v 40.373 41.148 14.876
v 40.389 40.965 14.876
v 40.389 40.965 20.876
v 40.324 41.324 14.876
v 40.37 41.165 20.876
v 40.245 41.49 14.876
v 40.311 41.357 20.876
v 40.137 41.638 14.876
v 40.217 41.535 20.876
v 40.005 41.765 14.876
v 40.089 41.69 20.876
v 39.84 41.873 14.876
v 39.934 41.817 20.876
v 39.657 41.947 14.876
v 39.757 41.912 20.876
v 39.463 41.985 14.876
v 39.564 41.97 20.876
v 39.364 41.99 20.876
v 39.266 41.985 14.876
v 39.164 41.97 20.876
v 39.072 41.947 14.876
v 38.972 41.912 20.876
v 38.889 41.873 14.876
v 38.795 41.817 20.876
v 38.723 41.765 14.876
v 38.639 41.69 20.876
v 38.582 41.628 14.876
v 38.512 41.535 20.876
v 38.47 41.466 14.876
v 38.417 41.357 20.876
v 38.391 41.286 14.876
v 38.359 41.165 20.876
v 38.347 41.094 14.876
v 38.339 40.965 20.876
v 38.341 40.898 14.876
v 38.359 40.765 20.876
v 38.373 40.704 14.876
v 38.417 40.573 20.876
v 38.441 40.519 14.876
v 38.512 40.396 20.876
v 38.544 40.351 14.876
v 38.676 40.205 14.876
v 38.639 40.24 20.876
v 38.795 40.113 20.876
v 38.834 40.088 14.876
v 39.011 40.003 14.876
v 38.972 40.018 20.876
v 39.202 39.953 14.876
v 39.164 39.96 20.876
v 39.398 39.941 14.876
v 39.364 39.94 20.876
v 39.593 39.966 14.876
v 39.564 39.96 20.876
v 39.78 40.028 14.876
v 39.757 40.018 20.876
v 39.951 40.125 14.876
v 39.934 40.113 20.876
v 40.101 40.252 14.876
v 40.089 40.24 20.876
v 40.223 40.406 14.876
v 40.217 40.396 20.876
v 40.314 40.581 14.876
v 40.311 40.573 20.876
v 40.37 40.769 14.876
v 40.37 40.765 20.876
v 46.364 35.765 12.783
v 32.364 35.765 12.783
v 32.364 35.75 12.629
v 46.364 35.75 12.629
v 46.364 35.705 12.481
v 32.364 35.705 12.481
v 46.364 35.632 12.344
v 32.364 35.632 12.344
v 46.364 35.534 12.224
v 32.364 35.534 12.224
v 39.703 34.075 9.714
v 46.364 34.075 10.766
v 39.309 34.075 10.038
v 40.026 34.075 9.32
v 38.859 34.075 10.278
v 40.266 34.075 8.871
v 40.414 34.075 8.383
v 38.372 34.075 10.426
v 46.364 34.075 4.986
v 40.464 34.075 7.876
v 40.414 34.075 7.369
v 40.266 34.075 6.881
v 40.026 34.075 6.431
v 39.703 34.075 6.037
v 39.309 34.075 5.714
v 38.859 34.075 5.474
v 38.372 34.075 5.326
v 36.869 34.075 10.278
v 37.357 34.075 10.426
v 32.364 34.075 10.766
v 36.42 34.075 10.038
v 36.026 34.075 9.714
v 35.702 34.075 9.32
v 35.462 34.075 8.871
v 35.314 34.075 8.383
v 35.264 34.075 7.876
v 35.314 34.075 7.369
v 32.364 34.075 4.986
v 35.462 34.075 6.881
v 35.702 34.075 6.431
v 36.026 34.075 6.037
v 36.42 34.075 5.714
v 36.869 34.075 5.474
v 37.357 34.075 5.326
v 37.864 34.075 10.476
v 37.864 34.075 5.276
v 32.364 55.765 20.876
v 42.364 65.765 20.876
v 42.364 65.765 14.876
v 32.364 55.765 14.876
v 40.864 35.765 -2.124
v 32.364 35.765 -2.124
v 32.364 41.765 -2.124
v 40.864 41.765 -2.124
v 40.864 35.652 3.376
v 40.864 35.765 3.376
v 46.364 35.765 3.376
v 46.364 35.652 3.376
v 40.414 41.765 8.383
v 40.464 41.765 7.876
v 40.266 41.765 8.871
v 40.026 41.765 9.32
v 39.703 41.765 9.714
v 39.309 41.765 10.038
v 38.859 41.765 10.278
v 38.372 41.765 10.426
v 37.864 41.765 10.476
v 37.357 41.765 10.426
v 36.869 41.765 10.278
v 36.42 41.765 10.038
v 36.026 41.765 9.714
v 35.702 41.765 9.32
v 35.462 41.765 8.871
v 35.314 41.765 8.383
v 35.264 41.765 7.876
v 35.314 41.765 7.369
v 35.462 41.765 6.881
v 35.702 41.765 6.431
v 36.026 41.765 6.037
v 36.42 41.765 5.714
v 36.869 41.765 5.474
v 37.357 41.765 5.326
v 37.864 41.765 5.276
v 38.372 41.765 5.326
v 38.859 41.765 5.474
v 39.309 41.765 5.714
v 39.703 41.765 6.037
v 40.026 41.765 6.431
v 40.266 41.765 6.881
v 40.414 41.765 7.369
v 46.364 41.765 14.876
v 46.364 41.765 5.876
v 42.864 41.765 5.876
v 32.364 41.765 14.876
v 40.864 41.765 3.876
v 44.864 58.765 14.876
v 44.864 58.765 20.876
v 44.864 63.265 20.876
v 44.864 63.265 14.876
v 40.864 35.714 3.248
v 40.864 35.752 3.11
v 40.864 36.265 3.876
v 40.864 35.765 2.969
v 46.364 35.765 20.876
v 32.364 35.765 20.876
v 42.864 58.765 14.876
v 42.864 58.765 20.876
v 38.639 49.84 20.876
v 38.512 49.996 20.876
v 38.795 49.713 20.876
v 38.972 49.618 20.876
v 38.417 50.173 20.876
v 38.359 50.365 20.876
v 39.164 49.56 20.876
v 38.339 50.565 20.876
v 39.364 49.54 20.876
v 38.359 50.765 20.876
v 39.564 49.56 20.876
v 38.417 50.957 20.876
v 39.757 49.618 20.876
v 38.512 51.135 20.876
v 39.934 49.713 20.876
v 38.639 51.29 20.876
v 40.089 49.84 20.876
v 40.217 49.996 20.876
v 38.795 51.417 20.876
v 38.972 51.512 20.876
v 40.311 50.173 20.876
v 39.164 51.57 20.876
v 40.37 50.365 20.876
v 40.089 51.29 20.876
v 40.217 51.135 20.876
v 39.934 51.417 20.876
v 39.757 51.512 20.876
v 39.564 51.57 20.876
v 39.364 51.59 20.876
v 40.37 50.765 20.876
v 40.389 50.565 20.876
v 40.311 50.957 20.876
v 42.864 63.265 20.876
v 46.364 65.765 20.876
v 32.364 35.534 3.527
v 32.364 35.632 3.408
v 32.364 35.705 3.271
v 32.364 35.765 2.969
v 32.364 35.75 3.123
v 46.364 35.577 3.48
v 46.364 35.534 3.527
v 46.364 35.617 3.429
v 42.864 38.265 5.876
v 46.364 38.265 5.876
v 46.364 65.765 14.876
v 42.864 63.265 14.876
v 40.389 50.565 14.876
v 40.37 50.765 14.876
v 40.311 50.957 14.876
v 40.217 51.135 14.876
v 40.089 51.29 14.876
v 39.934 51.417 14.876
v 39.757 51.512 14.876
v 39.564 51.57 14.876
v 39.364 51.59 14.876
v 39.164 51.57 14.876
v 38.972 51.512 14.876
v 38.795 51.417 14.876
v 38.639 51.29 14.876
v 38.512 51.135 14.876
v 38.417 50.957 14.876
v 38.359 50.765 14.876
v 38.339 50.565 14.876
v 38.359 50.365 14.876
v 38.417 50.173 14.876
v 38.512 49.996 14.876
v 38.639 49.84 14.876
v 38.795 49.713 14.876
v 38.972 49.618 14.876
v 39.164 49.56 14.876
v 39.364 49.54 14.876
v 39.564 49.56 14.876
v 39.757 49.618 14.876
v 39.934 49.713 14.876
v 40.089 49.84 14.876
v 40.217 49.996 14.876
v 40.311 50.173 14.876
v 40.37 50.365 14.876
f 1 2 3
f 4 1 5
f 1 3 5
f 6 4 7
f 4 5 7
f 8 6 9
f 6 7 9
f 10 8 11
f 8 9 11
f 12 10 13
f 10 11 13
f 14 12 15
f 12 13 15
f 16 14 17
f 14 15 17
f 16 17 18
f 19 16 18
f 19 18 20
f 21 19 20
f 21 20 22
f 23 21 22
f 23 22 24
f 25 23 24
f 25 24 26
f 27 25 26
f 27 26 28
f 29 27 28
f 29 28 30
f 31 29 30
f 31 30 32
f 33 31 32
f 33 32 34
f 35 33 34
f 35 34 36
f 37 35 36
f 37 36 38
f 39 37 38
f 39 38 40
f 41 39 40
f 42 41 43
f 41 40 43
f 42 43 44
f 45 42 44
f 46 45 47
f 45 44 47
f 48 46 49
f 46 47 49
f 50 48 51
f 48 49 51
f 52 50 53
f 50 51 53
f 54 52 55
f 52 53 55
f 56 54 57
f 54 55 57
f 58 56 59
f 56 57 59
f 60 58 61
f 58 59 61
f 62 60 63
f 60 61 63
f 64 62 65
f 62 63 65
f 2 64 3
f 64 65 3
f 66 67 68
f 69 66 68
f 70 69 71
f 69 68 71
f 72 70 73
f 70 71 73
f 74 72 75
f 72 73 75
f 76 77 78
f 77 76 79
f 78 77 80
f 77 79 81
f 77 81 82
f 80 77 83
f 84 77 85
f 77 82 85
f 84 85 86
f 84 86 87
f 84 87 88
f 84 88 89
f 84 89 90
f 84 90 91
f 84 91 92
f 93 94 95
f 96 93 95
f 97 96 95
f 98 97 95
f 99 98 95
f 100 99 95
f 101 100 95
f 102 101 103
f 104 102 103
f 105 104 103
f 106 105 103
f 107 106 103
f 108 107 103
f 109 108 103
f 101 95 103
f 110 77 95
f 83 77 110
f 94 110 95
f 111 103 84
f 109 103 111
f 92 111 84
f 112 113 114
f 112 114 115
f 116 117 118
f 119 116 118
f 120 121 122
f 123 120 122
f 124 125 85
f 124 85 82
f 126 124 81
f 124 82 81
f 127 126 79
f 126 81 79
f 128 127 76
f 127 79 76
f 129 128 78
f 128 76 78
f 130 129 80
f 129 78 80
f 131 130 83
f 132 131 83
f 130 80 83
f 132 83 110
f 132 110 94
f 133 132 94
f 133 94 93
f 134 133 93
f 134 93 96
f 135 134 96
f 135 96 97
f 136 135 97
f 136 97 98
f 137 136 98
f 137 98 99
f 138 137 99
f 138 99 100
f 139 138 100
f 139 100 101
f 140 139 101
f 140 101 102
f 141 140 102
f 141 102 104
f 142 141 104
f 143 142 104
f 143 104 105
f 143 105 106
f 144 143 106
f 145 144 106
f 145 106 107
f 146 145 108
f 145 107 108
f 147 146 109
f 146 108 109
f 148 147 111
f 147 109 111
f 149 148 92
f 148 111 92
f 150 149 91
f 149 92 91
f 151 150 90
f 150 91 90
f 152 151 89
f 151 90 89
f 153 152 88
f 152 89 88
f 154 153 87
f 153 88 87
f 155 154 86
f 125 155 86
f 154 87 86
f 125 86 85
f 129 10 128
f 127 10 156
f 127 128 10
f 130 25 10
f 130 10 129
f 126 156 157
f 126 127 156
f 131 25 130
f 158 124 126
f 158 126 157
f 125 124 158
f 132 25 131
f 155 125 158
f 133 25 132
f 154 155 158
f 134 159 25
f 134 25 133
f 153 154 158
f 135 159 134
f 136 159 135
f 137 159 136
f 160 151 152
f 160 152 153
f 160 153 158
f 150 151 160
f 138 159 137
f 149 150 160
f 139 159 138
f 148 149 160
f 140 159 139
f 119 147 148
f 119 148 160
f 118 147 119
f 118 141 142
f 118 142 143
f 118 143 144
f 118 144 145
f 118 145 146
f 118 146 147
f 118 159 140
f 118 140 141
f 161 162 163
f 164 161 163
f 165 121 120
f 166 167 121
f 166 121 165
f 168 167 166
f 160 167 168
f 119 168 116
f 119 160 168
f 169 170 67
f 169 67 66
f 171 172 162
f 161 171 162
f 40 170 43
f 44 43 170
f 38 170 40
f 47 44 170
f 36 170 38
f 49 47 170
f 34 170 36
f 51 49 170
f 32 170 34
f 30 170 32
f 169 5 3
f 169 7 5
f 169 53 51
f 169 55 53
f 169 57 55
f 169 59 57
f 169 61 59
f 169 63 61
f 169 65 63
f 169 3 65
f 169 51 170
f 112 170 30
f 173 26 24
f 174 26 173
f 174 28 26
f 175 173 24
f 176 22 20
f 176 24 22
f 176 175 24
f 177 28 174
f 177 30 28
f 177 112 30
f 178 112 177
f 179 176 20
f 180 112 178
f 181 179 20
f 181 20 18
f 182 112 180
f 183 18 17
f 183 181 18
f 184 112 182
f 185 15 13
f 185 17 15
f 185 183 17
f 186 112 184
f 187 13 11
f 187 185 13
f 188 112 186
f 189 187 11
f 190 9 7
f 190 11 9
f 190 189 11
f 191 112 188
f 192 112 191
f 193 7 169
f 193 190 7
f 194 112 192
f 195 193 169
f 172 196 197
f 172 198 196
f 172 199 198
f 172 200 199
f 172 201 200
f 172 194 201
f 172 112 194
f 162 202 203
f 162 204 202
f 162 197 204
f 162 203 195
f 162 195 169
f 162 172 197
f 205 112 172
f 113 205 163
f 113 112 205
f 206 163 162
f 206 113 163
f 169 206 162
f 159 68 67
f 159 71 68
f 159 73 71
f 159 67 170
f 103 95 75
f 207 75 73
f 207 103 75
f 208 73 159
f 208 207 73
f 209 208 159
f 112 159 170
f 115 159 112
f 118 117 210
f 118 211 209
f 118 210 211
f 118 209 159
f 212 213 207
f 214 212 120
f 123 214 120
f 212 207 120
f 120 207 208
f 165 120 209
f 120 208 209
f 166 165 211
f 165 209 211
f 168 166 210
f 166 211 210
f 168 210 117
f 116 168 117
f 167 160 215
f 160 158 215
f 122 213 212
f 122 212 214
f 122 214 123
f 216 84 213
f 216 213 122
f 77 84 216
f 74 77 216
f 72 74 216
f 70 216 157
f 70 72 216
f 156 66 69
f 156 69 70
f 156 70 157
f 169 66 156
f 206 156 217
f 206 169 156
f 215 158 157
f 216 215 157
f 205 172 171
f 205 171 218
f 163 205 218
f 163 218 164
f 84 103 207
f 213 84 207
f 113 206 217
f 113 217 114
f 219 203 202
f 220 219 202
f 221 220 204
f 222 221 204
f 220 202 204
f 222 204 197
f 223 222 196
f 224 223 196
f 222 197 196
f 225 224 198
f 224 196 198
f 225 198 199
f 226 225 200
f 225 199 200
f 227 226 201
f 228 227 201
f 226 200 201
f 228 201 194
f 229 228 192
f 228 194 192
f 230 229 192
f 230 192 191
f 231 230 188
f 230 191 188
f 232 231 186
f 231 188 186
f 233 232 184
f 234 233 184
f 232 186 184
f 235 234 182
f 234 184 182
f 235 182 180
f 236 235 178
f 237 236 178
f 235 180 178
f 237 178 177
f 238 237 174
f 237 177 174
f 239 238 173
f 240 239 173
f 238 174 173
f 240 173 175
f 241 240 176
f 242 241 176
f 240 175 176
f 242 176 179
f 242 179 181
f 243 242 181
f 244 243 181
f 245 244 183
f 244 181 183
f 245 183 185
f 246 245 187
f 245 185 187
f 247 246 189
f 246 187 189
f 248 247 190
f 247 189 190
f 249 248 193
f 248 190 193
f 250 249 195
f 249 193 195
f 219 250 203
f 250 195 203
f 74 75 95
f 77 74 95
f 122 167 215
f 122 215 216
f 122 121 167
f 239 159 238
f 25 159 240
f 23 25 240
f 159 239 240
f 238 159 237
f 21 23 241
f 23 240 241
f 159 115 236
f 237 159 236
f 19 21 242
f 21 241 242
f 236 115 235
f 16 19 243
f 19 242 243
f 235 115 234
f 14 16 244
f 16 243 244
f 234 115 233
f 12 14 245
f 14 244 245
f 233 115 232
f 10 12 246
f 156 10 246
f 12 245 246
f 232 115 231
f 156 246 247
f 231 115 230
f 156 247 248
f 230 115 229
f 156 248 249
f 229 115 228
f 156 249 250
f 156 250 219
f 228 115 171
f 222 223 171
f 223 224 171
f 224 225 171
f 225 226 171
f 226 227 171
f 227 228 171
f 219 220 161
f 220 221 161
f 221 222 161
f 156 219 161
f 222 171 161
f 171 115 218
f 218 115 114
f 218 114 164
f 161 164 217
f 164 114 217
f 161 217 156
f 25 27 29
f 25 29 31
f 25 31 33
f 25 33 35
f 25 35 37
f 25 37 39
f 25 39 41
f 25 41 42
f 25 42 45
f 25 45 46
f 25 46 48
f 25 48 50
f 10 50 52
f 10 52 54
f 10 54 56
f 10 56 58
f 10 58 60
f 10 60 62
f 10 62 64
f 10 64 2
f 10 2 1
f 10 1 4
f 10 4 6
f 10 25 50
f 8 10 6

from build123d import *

# Parameters (mm, degrees)
SKETCH1_W                = 20
SKETCH1_H                = 6
BOSS_EXTRUDE1_DEPTH      = 14
CUT_EXTRUDE1_REACH       = 9.69
SKETCH2_R                = 2.6
SKETCH3_W                = 14
SKETCH3_H                = 20
BOSS_EXTRUDE2_DEPTH      = 3
BOSS_EXTRUDE2_DEPTH_BACK = 3
SKETCH4_R                = 1.025
CUT_EXTRUDE4_DEPTH       = 6
SKETCH5_W                = 5.5
SKETCH5_H                = 8
CUT_EXTRUDE5_DEPTH       = 6
CHAMFER1_SIZE            = 2
CHAMFER2_SIZE            = 2.5
SKETCH6_W                = 5.5
SKETCH6_H                = 0.407228715
CUT_EXTRUDE6_DEPTH       = 2.69
SKETCH7_W                = 2
SKETCH7_H                = 4.5
BOSS_EXTRUDE3_DEPTH      = 6


with BuildPart() as part:
    # Sketch1 → Boss-Extrude1 (new body)
    with BuildSketch(Plane(origin=(32.364284334, 0, 0), x_dir=(0, 0, -1), z_dir=(1, 0, 0))):
        with Locations((-7.875866483, 38.765059464)):
            Rectangle(SKETCH1_W, SKETCH1_H)
        with BuildLine():
            Line((-12.22448084, 35.533673821), (-10.765866483, 34.075059464))
            Line((-10.765866483, 34.075059464), (-4.985866483, 34.075059464))
            Line((-4.985866483, 34.075059464), (-3.527252126, 35.533673821))
            ThreePointArc((-3.527252126, 35.533673821), (-3.27095768, 35.704924294), (-2.968637768, 35.765059464))
            Line((-2.968637768, 35.765059464), (-12.783095197, 35.765059464))
            ThreePointArc((-12.783095197, 35.765059464), (-12.480775285, 35.704924294), (-12.22448084, 35.533673821))
        make_face()
    extrude(amount=BOSS_EXTRUDE1_DEPTH)

    # Sketch2 → Cut-Extrude1 (cut, up to next)
    with BuildSketch(Plane.XZ.offset(-34.075059464), mode=Mode.PRIVATE) as cut_extrude1_sk1:
        with Locations((37.864284334, 7.875866483)):
            Circle(SKETCH2_R)
    cut_extrude1_tool1 = extrude(cut_extrude1_sk1.sketch, amount=-CUT_EXTRUDE1_REACH, mode=Mode.PRIVATE) & part.part
    add(cut_extrude1_tool1.solids().sort_by_distance((37.864284, 34.075059, 7.875866))[0], mode=Mode.SUBTRACT)

    # Sketch3 → Boss-Extrude2 (add, two sides)
    with BuildSketch(Plane.XY.offset(17.875866483)) as boss_extrude2_sk:
        with Locations((39.364284334, 45.765059464)):
            Rectangle(SKETCH3_W, SKETCH3_H)
    extrude(amount=BOSS_EXTRUDE2_DEPTH)
    extrude(boss_extrude2_sk.sketch, amount=-BOSS_EXTRUDE2_DEPTH_BACK)

    # Sketch4 → Cut-Extrude4 (cut)
    with BuildSketch(Plane.XY.offset(20.875866483)):
        with Locations((39.364284334, 50.565059464)):
            Circle(SKETCH4_R)
        with Locations((39.364284334, 40.965059464)):
            Circle(SKETCH4_R)
    extrude(amount=-CUT_EXTRUDE4_DEPTH, mode=Mode.SUBTRACT)

    # Sketch5 → Cut-Extrude5 (cut)
    with BuildSketch(Plane(origin=(0, 41.765059464, 0), x_dir=(1, 0, 0), z_dir=(0, 1, 0))):
        with Locations((43.614284334, -1.875866483)):
            Rectangle(SKETCH5_W, SKETCH5_H)
    extrude(amount=-CUT_EXTRUDE5_DEPTH, mode=Mode.SUBTRACT)

    # Chamfer1
    chamfer1_edges = [part.edges().sort_by_distance(p)[0] for p in [
        (40.864284334, 38.765059464, 5.875866483),
    ]]
    chamfer(chamfer1_edges, length=CHAMFER1_SIZE)

    # Chamfer2
    chamfer2_edges = [part.edges().sort_by_distance(p)[0] for p in [
        (44.614284334, 35.765059464, 5.875866483),
    ]]
    chamfer(chamfer2_edges, length=CHAMFER2_SIZE)

    # Sketch6 → Cut-Extrude6 (cut, through all)
    with BuildSketch(Plane(origin=(0, 35.765059464, 0), x_dir=(1, 0, 0), z_dir=(0, 1, 0))):
        with Locations((43.614284334, -3.172252126)):
            Rectangle(SKETCH6_W, SKETCH6_H)
    extrude(amount=-CUT_EXTRUDE6_DEPTH, mode=Mode.SUBTRACT)

    # Sketch7 → Boss-Extrude3 (add)
    with BuildSketch(Plane.XY.offset(20.875866483)):
        Polygon((46.364284334, 55.765059464), (46.364284334, 65.765059464), (42.364284334, 65.765059464), (32.364284334, 55.765059464), align=None)
        with Locations((43.864284334, 61.015059464)):
            Rectangle(SKETCH7_W, SKETCH7_H, mode=Mode.SUBTRACT)
    extrude(amount=-BOSS_EXTRUDE3_DEPTH)


solid = part.part
